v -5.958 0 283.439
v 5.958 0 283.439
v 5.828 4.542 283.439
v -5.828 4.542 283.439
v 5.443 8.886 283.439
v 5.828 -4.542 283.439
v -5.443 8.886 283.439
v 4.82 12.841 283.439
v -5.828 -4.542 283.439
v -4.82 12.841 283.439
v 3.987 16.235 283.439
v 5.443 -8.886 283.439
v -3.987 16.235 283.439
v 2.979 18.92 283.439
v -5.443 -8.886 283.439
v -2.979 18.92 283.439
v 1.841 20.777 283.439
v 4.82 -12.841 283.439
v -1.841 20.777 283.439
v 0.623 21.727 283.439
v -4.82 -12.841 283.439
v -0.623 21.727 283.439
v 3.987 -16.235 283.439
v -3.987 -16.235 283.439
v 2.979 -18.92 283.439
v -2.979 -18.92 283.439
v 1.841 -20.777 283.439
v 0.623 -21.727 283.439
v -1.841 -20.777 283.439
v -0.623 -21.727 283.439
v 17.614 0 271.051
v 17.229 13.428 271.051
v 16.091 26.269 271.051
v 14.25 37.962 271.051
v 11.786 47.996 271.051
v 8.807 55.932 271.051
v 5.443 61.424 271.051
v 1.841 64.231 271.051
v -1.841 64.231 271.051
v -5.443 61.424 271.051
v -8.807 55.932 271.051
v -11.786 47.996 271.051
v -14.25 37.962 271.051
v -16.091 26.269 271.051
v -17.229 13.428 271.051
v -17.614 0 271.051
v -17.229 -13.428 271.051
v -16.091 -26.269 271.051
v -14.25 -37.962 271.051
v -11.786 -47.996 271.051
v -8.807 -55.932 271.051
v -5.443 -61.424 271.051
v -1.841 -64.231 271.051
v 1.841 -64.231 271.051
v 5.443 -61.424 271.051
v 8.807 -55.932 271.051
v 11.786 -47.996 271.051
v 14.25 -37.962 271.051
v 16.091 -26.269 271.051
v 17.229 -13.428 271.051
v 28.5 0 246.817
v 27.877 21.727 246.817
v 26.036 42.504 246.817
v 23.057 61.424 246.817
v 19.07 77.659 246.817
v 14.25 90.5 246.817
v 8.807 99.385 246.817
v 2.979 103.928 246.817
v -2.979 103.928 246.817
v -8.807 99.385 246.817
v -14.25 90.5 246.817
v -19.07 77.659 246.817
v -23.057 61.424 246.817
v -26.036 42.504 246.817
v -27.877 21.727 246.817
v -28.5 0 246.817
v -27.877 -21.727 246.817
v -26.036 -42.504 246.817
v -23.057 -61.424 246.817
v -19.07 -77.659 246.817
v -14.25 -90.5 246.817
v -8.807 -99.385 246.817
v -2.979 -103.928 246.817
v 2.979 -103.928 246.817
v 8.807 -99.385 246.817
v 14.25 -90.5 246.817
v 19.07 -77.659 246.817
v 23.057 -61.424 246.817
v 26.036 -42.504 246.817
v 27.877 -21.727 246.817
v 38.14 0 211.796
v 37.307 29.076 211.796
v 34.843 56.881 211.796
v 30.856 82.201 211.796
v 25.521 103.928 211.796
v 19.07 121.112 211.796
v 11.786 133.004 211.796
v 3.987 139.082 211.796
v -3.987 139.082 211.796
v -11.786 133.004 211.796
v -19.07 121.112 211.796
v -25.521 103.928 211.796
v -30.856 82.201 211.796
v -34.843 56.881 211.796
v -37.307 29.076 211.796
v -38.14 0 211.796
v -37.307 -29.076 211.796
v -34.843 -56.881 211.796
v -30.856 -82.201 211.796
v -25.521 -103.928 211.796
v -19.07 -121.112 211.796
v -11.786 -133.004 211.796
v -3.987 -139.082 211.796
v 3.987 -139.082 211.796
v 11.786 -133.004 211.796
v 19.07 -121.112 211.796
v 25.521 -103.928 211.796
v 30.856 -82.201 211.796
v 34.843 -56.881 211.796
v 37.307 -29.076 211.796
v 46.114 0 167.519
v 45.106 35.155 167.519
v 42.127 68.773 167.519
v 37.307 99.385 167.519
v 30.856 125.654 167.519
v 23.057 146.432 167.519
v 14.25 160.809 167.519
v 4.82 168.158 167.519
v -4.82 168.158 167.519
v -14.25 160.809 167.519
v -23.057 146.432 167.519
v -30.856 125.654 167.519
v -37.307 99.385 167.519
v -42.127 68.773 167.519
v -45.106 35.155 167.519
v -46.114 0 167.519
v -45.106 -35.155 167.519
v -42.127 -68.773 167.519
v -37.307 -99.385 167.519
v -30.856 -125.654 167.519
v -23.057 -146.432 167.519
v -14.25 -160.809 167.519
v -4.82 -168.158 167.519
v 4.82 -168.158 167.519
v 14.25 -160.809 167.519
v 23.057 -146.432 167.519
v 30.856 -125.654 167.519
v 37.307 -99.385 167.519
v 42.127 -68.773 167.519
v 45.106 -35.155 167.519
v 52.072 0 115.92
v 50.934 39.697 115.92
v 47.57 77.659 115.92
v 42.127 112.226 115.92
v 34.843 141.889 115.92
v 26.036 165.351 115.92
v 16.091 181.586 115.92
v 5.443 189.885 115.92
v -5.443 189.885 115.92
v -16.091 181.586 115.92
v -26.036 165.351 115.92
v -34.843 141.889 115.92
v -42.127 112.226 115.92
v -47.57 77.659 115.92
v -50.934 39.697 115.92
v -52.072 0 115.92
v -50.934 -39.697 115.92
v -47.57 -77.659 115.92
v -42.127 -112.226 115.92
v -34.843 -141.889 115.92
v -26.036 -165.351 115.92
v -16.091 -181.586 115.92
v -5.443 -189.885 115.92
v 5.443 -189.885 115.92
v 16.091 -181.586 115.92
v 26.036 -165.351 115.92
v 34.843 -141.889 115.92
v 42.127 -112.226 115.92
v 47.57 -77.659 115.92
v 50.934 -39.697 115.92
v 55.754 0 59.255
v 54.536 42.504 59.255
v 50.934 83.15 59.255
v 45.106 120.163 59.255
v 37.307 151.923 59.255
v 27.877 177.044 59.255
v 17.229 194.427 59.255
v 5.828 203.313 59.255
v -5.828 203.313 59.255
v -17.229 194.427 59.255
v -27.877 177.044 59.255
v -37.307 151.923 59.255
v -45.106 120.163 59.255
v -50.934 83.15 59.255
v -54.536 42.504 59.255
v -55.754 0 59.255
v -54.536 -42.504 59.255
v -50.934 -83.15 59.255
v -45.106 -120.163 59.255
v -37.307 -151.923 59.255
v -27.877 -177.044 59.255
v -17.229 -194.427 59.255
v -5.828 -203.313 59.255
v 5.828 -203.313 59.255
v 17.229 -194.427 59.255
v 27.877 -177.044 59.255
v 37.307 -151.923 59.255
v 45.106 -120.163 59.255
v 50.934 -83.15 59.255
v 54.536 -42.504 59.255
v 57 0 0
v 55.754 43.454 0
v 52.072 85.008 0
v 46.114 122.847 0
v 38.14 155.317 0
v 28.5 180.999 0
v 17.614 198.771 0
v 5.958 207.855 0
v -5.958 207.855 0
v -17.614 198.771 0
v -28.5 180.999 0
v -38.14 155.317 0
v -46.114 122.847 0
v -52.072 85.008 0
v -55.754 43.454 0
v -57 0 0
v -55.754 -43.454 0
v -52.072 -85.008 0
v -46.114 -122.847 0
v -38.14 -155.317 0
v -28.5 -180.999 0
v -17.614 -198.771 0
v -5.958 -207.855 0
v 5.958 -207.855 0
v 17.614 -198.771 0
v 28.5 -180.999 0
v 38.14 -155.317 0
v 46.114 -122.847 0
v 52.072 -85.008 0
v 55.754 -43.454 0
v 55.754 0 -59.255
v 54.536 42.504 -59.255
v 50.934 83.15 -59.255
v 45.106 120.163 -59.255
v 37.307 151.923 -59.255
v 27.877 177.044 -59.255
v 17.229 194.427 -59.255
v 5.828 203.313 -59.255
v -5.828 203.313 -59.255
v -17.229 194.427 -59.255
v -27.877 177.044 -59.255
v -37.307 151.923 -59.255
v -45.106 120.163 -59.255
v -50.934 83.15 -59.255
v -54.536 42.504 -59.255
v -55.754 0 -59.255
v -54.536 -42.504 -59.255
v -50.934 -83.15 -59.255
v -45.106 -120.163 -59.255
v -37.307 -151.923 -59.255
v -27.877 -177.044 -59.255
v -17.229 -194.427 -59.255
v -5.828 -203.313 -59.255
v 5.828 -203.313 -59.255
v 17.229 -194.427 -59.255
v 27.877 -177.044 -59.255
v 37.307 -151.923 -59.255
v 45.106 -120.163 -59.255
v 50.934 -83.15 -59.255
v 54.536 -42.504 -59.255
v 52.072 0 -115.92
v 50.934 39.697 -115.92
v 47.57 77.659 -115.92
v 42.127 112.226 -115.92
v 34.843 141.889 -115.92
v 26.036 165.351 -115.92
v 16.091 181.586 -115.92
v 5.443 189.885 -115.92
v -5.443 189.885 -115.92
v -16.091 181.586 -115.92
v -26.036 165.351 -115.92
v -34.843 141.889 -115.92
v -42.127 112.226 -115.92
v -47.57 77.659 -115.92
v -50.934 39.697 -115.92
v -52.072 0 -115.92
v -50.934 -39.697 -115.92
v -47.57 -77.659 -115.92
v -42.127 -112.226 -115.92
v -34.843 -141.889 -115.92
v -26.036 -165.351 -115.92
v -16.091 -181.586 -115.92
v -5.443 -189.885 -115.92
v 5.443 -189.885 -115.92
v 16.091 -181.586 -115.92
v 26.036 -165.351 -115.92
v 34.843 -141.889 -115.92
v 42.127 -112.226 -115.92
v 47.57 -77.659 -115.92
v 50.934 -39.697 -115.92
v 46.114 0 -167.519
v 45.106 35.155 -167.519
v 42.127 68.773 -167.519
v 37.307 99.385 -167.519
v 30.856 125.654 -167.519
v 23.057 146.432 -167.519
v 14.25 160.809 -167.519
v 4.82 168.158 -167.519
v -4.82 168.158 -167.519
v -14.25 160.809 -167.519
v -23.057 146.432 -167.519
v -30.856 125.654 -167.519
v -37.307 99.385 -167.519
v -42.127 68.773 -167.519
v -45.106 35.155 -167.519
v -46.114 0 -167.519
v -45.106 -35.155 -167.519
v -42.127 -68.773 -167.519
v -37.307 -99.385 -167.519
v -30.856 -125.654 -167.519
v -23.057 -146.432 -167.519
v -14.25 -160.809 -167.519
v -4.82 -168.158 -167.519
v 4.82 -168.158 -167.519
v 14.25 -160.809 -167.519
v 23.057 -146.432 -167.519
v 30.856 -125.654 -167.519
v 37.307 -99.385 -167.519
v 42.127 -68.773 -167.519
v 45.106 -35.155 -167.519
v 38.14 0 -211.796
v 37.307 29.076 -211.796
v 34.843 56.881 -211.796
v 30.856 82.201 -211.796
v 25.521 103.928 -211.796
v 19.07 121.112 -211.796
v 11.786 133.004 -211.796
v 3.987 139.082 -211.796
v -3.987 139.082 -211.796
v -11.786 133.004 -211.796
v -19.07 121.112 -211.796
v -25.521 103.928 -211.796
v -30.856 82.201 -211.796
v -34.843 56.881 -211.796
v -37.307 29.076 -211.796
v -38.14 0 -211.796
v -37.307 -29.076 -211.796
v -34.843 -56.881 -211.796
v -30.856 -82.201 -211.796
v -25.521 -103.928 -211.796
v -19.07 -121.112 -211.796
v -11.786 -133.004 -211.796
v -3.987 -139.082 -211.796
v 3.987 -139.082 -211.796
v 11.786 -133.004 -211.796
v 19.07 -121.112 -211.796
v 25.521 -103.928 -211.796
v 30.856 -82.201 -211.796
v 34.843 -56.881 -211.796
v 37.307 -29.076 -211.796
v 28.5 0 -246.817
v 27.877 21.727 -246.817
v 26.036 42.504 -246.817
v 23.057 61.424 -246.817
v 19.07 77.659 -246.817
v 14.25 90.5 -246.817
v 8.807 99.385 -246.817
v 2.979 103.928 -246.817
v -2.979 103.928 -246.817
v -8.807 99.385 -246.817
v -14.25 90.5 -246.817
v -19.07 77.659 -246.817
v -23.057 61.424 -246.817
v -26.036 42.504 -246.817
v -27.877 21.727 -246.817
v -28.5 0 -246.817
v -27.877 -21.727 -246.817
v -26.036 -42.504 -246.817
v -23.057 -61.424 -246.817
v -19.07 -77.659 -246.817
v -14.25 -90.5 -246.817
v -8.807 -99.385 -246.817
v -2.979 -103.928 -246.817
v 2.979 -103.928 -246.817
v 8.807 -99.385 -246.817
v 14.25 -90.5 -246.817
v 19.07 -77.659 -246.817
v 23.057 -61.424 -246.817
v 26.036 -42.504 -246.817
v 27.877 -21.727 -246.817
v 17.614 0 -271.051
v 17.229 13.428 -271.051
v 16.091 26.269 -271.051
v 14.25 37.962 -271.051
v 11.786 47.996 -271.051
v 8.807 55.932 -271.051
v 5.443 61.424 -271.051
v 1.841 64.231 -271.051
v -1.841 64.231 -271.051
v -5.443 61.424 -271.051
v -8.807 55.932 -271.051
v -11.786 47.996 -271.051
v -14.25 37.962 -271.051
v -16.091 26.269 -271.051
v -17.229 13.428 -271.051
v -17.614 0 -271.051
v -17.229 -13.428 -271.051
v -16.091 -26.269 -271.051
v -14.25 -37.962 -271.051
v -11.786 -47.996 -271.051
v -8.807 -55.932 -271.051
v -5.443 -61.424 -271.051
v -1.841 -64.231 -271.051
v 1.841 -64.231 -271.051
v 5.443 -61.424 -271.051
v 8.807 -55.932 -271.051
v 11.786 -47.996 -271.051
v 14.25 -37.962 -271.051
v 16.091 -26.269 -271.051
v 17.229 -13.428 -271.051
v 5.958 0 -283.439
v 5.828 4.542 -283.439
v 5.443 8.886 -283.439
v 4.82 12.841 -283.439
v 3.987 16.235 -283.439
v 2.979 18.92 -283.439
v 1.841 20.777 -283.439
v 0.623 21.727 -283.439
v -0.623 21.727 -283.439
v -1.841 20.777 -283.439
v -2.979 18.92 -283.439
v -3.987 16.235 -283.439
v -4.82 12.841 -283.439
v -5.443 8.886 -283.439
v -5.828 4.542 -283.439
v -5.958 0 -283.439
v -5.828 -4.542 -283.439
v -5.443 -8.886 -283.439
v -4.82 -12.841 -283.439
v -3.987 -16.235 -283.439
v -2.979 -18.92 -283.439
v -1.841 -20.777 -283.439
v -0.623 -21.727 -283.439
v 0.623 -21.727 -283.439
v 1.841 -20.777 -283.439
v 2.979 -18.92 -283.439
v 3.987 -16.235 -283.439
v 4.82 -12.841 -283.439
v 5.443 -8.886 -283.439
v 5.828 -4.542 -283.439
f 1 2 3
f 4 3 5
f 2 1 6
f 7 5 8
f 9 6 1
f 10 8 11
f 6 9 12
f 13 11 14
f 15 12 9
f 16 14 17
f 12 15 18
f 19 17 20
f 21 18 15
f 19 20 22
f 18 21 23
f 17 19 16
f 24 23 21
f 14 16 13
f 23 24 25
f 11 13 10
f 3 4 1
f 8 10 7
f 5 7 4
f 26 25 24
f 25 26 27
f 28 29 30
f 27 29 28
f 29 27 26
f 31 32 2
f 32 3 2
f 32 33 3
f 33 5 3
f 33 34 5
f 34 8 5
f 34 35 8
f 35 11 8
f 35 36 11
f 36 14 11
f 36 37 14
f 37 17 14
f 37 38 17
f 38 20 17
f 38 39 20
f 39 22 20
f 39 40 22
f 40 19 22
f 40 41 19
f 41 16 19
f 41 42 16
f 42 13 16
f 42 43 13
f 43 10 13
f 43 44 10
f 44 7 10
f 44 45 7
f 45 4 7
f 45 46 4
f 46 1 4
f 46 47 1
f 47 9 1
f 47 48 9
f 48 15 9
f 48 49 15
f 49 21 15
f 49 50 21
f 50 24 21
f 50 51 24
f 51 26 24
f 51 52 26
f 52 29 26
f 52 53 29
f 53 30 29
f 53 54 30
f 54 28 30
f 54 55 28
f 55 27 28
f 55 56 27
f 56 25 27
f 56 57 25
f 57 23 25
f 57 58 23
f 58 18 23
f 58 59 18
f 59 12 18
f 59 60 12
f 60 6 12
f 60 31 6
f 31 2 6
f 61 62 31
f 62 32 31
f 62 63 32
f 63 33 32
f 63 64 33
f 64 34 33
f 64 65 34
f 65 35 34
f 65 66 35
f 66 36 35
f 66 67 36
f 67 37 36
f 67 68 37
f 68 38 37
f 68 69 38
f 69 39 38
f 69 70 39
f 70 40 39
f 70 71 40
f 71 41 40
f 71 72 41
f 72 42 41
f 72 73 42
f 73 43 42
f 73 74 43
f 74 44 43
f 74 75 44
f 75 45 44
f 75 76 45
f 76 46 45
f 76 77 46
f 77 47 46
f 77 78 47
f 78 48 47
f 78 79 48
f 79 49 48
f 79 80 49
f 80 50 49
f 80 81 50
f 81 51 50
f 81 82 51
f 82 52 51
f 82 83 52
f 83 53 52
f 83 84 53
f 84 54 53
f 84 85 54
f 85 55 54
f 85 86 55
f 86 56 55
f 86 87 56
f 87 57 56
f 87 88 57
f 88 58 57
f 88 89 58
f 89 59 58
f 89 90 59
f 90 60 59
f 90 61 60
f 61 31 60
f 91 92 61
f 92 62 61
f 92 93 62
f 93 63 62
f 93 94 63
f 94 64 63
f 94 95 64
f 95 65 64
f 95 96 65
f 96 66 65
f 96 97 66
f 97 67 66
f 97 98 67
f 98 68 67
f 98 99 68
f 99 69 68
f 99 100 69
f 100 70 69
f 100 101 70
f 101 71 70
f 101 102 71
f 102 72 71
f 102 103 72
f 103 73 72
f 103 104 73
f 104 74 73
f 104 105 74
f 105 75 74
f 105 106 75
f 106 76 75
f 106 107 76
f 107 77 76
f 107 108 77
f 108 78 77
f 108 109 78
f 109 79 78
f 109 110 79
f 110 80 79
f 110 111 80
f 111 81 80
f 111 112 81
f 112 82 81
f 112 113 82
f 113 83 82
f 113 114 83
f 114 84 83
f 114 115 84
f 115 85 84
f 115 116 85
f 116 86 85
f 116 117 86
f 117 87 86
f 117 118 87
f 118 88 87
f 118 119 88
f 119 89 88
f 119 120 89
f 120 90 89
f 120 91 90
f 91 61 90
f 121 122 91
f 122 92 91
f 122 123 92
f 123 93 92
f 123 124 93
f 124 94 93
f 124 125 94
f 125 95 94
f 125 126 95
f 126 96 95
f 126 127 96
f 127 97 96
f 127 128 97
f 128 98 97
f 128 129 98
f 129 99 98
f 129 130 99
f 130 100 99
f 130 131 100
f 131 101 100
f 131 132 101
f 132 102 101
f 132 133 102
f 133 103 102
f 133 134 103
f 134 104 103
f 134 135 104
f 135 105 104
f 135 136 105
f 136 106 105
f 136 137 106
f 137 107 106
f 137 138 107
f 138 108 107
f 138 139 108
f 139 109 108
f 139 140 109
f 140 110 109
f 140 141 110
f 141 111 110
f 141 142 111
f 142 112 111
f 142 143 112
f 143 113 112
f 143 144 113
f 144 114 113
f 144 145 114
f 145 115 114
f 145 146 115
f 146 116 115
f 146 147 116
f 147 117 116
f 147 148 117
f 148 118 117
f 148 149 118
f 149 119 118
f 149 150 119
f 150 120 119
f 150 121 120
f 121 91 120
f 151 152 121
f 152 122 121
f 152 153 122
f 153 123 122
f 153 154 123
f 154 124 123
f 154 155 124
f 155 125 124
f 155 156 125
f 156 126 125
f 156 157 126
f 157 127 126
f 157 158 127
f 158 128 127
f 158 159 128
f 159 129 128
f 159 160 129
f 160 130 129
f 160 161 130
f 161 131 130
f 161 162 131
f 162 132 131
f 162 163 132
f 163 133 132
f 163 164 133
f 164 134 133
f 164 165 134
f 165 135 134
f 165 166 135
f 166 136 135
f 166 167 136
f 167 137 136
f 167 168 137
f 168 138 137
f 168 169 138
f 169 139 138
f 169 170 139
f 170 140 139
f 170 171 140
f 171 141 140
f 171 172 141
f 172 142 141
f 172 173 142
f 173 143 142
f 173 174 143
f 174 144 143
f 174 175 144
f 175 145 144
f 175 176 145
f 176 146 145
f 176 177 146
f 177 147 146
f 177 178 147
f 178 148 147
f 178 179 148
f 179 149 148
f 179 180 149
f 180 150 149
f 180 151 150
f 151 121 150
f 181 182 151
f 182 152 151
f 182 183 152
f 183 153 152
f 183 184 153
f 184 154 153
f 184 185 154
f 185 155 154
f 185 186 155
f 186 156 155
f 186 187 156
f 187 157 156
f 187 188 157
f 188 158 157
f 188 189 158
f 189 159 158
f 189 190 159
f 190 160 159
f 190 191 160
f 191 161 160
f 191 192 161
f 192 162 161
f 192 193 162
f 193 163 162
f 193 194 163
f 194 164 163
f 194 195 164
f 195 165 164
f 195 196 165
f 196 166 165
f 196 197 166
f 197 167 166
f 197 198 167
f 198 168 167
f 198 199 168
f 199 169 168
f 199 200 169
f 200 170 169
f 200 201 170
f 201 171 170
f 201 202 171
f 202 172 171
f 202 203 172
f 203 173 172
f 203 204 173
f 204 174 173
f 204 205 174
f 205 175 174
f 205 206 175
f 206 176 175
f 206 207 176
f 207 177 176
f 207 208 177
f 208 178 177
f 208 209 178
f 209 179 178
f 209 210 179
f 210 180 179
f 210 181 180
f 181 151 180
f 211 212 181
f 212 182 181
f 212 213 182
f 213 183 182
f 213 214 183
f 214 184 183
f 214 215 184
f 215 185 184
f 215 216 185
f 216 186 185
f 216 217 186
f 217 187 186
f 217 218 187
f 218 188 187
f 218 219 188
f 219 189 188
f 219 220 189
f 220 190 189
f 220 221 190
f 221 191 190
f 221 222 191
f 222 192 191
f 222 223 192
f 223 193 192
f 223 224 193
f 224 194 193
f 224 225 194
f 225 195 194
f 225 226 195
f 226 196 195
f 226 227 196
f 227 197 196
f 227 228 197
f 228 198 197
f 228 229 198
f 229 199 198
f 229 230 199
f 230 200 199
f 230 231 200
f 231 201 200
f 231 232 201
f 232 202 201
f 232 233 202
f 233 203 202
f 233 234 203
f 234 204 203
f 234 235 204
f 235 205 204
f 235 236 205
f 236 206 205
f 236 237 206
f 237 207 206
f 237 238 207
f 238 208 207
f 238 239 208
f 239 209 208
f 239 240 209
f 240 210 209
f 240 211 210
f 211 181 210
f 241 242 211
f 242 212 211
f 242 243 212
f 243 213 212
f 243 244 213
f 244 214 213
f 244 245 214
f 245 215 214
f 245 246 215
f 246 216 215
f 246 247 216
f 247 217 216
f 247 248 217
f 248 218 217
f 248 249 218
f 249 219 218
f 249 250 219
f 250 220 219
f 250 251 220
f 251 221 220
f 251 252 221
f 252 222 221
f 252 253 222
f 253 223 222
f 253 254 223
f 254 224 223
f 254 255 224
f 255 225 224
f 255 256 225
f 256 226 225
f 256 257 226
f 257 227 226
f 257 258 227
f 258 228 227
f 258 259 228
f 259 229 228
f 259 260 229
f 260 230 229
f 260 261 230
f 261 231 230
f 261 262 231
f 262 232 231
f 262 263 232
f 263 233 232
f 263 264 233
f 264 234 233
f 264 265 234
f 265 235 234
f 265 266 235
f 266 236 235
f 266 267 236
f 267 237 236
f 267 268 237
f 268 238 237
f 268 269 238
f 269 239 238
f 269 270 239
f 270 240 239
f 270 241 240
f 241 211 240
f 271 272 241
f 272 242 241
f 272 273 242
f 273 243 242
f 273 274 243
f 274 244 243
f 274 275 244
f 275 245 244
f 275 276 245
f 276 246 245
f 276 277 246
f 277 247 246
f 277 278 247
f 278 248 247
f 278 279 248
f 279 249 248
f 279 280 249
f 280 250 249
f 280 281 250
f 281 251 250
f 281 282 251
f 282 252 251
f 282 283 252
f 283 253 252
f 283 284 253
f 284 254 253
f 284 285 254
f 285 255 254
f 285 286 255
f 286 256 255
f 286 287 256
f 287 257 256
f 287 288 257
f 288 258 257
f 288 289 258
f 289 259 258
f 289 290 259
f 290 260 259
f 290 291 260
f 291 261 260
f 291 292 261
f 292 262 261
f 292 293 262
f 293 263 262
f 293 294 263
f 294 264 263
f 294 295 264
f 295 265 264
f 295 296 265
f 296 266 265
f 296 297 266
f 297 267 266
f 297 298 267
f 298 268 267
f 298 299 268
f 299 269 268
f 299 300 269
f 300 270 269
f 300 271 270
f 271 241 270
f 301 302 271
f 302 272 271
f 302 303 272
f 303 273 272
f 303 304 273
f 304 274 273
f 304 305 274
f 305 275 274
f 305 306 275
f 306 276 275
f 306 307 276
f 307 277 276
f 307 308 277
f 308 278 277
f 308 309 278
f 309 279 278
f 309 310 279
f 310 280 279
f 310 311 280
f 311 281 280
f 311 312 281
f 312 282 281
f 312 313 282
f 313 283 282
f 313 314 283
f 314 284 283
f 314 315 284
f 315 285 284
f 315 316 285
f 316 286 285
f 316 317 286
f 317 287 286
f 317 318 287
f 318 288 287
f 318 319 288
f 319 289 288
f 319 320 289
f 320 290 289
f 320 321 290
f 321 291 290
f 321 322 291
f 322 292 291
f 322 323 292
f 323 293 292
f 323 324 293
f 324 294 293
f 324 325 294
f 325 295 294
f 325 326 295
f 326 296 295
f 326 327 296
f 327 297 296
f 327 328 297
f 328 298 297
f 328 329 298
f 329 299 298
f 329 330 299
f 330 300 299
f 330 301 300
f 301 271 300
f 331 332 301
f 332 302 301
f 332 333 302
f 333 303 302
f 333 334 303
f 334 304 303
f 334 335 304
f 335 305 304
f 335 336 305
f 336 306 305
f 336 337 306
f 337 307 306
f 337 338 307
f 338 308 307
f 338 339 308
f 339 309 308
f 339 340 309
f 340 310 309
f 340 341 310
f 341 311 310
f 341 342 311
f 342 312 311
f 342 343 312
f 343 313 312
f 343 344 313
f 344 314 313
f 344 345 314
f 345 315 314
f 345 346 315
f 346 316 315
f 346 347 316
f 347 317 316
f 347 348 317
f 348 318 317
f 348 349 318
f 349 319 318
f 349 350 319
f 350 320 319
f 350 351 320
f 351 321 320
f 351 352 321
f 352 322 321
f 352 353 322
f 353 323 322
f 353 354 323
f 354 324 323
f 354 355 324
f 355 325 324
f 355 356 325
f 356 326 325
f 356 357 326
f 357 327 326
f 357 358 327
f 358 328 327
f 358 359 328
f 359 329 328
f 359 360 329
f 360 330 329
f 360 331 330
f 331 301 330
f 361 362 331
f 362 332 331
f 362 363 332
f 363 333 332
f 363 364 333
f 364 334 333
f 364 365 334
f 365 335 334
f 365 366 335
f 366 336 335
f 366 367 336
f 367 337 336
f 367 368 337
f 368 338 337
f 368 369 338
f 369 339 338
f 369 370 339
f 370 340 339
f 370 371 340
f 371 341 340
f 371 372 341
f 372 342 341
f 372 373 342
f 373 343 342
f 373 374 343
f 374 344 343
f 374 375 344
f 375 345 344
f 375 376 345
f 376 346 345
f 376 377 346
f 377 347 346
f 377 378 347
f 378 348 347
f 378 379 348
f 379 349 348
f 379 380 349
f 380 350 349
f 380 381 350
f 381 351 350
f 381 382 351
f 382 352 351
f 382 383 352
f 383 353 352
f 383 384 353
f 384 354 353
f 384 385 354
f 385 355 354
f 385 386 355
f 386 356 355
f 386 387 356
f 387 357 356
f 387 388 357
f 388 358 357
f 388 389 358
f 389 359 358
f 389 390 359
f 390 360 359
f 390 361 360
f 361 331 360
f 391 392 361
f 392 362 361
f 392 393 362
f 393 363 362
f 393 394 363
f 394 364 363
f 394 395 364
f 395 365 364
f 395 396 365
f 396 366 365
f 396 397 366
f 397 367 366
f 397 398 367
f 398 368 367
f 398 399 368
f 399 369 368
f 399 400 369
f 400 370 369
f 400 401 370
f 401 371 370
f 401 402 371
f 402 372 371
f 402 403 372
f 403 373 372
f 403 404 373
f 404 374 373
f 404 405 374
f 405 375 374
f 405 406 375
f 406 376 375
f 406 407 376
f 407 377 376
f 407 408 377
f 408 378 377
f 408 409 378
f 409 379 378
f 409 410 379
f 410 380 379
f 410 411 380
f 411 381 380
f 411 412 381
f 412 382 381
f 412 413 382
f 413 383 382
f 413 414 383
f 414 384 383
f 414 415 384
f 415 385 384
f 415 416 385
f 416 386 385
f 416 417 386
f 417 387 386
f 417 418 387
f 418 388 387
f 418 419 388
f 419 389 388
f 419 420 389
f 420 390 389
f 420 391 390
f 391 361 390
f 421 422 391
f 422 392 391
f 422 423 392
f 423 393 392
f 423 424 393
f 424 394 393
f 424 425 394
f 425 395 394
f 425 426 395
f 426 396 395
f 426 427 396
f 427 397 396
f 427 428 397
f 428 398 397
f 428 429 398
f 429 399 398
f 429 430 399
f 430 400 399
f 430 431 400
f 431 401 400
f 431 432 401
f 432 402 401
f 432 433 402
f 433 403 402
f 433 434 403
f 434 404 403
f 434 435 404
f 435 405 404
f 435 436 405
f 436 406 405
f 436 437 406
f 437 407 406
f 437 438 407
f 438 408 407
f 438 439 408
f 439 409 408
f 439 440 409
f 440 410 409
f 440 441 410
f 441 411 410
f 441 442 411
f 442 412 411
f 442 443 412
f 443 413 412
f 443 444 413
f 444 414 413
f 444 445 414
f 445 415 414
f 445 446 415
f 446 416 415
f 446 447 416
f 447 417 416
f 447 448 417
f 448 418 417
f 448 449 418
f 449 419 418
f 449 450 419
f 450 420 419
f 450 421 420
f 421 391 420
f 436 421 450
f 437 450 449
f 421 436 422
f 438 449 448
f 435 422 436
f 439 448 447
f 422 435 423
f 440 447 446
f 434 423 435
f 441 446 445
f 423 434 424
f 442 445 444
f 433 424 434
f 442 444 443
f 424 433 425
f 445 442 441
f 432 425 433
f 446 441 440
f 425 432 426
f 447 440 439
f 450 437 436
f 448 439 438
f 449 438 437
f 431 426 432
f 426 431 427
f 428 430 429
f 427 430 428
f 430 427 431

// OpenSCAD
// Generated by SolidPython 1.0.1 on 2020-07-29 00:39:25


scale(v = [3, 11, 15]) {
	sphere(r = 19);
}
/***********************************************
*********      SolidPython code:      **********
************************************************
 
# import packages: SolidPython
from solid import *
from solid.utils import *
from itertools import chain, combinations


class Resize:

    def __init__(self, scad_file):
        self.scad_file = scad_file
        #self.scad_file = import_scad(scad_file)
        # cone/cylinder param:
        self.r1 = 0
        self.r2 = 0
        self.h = 0
        # rectangular prism param:
        self.w = 0
        self.l = 0
        # ellipse param:
        self.r = 0

    # import OpenScad code (file name corresponds to shape)


    # classify shape + parameters
    def assign(self, param1, param2, param3):
        if self.scad_file == 'cone.scad':
            self.r1 = param1
            self.r2 = param2
            self.h = param3
        elif self.scad_file == 'cylinder.scad':
            self.r1 = param1
            self.r2 = param2
            self.h = param3
        elif self.scad_file == 'rectangularPrism.scad':
            self.h = param1
            self.l = param2
            self.w = param3
        else:
            self.r = param1
            self.h = param2

    # resize parameters
    def iterate(self):
        x = range(3, 20, 2)
        i = 1
        if self.scad_file == 'cone.scad':
            tempList = list(combinations(x, 2))
            for temp in tempList:
                param1 = temp[0]
                param2 = temp[1]
                filepath = 'produced_scad_files/' + 'cone' + str(param1) + '_' + str(param2) + '_' + '.scad'
                scad_render_to_file(cylinder(h=param1, r1=param2, r2=0), filepath)

        elif self.scad_file == 'cylinder.scad':
            tempList = list(combinations(x, 3))
            for temp in tempList:
                param1 = temp[0]
                param2 = temp[1]
                filepath = 'produced_scad_files/' + 'cylinder' + str(param1) + '_' + str(param2) + '_' + '.scad'
                scad_render_to_file(cylinder(h=param1, r1=param2, r2=param2), filepath)

        elif self.scad_file == 'rectangularPrism.scad':
            tempList = list(combinations(x, 3))
            for temp in tempList:
                param1 = temp[0]
                param2 = temp[1]
                param3 = temp[2]
                filepath = 'produced_scad_files/' + 'rectangularPrism' + str(param1) + '_' + str(param2) + '_' + str(
                    param3) + '.scad'
                scad_render_to_file(cube(size=(param1, param2, param3)), filepath)

        elif self.scad_file == 'ellipse.scad':
            tempList = list(combinations(x, 4))
            for temp in tempList:
                param1 = temp[0]
                param2 = temp[1]
                param3 = temp[2]
                param4 = temp[3]
                filepath = 'produced_scad_files/' + 'ellipse' + str(param1) + '_' + str(param2) + '_' + str(param3) + '_' + str(param4) + '.scad'
                scad_render_to_file(scale([param1, param2, param3])(sphere(r=param4)), filepath)

    def render_to_scadfile(self):
        scad_render_to_file(scad, 'example.scad') 
 
************************************************/
